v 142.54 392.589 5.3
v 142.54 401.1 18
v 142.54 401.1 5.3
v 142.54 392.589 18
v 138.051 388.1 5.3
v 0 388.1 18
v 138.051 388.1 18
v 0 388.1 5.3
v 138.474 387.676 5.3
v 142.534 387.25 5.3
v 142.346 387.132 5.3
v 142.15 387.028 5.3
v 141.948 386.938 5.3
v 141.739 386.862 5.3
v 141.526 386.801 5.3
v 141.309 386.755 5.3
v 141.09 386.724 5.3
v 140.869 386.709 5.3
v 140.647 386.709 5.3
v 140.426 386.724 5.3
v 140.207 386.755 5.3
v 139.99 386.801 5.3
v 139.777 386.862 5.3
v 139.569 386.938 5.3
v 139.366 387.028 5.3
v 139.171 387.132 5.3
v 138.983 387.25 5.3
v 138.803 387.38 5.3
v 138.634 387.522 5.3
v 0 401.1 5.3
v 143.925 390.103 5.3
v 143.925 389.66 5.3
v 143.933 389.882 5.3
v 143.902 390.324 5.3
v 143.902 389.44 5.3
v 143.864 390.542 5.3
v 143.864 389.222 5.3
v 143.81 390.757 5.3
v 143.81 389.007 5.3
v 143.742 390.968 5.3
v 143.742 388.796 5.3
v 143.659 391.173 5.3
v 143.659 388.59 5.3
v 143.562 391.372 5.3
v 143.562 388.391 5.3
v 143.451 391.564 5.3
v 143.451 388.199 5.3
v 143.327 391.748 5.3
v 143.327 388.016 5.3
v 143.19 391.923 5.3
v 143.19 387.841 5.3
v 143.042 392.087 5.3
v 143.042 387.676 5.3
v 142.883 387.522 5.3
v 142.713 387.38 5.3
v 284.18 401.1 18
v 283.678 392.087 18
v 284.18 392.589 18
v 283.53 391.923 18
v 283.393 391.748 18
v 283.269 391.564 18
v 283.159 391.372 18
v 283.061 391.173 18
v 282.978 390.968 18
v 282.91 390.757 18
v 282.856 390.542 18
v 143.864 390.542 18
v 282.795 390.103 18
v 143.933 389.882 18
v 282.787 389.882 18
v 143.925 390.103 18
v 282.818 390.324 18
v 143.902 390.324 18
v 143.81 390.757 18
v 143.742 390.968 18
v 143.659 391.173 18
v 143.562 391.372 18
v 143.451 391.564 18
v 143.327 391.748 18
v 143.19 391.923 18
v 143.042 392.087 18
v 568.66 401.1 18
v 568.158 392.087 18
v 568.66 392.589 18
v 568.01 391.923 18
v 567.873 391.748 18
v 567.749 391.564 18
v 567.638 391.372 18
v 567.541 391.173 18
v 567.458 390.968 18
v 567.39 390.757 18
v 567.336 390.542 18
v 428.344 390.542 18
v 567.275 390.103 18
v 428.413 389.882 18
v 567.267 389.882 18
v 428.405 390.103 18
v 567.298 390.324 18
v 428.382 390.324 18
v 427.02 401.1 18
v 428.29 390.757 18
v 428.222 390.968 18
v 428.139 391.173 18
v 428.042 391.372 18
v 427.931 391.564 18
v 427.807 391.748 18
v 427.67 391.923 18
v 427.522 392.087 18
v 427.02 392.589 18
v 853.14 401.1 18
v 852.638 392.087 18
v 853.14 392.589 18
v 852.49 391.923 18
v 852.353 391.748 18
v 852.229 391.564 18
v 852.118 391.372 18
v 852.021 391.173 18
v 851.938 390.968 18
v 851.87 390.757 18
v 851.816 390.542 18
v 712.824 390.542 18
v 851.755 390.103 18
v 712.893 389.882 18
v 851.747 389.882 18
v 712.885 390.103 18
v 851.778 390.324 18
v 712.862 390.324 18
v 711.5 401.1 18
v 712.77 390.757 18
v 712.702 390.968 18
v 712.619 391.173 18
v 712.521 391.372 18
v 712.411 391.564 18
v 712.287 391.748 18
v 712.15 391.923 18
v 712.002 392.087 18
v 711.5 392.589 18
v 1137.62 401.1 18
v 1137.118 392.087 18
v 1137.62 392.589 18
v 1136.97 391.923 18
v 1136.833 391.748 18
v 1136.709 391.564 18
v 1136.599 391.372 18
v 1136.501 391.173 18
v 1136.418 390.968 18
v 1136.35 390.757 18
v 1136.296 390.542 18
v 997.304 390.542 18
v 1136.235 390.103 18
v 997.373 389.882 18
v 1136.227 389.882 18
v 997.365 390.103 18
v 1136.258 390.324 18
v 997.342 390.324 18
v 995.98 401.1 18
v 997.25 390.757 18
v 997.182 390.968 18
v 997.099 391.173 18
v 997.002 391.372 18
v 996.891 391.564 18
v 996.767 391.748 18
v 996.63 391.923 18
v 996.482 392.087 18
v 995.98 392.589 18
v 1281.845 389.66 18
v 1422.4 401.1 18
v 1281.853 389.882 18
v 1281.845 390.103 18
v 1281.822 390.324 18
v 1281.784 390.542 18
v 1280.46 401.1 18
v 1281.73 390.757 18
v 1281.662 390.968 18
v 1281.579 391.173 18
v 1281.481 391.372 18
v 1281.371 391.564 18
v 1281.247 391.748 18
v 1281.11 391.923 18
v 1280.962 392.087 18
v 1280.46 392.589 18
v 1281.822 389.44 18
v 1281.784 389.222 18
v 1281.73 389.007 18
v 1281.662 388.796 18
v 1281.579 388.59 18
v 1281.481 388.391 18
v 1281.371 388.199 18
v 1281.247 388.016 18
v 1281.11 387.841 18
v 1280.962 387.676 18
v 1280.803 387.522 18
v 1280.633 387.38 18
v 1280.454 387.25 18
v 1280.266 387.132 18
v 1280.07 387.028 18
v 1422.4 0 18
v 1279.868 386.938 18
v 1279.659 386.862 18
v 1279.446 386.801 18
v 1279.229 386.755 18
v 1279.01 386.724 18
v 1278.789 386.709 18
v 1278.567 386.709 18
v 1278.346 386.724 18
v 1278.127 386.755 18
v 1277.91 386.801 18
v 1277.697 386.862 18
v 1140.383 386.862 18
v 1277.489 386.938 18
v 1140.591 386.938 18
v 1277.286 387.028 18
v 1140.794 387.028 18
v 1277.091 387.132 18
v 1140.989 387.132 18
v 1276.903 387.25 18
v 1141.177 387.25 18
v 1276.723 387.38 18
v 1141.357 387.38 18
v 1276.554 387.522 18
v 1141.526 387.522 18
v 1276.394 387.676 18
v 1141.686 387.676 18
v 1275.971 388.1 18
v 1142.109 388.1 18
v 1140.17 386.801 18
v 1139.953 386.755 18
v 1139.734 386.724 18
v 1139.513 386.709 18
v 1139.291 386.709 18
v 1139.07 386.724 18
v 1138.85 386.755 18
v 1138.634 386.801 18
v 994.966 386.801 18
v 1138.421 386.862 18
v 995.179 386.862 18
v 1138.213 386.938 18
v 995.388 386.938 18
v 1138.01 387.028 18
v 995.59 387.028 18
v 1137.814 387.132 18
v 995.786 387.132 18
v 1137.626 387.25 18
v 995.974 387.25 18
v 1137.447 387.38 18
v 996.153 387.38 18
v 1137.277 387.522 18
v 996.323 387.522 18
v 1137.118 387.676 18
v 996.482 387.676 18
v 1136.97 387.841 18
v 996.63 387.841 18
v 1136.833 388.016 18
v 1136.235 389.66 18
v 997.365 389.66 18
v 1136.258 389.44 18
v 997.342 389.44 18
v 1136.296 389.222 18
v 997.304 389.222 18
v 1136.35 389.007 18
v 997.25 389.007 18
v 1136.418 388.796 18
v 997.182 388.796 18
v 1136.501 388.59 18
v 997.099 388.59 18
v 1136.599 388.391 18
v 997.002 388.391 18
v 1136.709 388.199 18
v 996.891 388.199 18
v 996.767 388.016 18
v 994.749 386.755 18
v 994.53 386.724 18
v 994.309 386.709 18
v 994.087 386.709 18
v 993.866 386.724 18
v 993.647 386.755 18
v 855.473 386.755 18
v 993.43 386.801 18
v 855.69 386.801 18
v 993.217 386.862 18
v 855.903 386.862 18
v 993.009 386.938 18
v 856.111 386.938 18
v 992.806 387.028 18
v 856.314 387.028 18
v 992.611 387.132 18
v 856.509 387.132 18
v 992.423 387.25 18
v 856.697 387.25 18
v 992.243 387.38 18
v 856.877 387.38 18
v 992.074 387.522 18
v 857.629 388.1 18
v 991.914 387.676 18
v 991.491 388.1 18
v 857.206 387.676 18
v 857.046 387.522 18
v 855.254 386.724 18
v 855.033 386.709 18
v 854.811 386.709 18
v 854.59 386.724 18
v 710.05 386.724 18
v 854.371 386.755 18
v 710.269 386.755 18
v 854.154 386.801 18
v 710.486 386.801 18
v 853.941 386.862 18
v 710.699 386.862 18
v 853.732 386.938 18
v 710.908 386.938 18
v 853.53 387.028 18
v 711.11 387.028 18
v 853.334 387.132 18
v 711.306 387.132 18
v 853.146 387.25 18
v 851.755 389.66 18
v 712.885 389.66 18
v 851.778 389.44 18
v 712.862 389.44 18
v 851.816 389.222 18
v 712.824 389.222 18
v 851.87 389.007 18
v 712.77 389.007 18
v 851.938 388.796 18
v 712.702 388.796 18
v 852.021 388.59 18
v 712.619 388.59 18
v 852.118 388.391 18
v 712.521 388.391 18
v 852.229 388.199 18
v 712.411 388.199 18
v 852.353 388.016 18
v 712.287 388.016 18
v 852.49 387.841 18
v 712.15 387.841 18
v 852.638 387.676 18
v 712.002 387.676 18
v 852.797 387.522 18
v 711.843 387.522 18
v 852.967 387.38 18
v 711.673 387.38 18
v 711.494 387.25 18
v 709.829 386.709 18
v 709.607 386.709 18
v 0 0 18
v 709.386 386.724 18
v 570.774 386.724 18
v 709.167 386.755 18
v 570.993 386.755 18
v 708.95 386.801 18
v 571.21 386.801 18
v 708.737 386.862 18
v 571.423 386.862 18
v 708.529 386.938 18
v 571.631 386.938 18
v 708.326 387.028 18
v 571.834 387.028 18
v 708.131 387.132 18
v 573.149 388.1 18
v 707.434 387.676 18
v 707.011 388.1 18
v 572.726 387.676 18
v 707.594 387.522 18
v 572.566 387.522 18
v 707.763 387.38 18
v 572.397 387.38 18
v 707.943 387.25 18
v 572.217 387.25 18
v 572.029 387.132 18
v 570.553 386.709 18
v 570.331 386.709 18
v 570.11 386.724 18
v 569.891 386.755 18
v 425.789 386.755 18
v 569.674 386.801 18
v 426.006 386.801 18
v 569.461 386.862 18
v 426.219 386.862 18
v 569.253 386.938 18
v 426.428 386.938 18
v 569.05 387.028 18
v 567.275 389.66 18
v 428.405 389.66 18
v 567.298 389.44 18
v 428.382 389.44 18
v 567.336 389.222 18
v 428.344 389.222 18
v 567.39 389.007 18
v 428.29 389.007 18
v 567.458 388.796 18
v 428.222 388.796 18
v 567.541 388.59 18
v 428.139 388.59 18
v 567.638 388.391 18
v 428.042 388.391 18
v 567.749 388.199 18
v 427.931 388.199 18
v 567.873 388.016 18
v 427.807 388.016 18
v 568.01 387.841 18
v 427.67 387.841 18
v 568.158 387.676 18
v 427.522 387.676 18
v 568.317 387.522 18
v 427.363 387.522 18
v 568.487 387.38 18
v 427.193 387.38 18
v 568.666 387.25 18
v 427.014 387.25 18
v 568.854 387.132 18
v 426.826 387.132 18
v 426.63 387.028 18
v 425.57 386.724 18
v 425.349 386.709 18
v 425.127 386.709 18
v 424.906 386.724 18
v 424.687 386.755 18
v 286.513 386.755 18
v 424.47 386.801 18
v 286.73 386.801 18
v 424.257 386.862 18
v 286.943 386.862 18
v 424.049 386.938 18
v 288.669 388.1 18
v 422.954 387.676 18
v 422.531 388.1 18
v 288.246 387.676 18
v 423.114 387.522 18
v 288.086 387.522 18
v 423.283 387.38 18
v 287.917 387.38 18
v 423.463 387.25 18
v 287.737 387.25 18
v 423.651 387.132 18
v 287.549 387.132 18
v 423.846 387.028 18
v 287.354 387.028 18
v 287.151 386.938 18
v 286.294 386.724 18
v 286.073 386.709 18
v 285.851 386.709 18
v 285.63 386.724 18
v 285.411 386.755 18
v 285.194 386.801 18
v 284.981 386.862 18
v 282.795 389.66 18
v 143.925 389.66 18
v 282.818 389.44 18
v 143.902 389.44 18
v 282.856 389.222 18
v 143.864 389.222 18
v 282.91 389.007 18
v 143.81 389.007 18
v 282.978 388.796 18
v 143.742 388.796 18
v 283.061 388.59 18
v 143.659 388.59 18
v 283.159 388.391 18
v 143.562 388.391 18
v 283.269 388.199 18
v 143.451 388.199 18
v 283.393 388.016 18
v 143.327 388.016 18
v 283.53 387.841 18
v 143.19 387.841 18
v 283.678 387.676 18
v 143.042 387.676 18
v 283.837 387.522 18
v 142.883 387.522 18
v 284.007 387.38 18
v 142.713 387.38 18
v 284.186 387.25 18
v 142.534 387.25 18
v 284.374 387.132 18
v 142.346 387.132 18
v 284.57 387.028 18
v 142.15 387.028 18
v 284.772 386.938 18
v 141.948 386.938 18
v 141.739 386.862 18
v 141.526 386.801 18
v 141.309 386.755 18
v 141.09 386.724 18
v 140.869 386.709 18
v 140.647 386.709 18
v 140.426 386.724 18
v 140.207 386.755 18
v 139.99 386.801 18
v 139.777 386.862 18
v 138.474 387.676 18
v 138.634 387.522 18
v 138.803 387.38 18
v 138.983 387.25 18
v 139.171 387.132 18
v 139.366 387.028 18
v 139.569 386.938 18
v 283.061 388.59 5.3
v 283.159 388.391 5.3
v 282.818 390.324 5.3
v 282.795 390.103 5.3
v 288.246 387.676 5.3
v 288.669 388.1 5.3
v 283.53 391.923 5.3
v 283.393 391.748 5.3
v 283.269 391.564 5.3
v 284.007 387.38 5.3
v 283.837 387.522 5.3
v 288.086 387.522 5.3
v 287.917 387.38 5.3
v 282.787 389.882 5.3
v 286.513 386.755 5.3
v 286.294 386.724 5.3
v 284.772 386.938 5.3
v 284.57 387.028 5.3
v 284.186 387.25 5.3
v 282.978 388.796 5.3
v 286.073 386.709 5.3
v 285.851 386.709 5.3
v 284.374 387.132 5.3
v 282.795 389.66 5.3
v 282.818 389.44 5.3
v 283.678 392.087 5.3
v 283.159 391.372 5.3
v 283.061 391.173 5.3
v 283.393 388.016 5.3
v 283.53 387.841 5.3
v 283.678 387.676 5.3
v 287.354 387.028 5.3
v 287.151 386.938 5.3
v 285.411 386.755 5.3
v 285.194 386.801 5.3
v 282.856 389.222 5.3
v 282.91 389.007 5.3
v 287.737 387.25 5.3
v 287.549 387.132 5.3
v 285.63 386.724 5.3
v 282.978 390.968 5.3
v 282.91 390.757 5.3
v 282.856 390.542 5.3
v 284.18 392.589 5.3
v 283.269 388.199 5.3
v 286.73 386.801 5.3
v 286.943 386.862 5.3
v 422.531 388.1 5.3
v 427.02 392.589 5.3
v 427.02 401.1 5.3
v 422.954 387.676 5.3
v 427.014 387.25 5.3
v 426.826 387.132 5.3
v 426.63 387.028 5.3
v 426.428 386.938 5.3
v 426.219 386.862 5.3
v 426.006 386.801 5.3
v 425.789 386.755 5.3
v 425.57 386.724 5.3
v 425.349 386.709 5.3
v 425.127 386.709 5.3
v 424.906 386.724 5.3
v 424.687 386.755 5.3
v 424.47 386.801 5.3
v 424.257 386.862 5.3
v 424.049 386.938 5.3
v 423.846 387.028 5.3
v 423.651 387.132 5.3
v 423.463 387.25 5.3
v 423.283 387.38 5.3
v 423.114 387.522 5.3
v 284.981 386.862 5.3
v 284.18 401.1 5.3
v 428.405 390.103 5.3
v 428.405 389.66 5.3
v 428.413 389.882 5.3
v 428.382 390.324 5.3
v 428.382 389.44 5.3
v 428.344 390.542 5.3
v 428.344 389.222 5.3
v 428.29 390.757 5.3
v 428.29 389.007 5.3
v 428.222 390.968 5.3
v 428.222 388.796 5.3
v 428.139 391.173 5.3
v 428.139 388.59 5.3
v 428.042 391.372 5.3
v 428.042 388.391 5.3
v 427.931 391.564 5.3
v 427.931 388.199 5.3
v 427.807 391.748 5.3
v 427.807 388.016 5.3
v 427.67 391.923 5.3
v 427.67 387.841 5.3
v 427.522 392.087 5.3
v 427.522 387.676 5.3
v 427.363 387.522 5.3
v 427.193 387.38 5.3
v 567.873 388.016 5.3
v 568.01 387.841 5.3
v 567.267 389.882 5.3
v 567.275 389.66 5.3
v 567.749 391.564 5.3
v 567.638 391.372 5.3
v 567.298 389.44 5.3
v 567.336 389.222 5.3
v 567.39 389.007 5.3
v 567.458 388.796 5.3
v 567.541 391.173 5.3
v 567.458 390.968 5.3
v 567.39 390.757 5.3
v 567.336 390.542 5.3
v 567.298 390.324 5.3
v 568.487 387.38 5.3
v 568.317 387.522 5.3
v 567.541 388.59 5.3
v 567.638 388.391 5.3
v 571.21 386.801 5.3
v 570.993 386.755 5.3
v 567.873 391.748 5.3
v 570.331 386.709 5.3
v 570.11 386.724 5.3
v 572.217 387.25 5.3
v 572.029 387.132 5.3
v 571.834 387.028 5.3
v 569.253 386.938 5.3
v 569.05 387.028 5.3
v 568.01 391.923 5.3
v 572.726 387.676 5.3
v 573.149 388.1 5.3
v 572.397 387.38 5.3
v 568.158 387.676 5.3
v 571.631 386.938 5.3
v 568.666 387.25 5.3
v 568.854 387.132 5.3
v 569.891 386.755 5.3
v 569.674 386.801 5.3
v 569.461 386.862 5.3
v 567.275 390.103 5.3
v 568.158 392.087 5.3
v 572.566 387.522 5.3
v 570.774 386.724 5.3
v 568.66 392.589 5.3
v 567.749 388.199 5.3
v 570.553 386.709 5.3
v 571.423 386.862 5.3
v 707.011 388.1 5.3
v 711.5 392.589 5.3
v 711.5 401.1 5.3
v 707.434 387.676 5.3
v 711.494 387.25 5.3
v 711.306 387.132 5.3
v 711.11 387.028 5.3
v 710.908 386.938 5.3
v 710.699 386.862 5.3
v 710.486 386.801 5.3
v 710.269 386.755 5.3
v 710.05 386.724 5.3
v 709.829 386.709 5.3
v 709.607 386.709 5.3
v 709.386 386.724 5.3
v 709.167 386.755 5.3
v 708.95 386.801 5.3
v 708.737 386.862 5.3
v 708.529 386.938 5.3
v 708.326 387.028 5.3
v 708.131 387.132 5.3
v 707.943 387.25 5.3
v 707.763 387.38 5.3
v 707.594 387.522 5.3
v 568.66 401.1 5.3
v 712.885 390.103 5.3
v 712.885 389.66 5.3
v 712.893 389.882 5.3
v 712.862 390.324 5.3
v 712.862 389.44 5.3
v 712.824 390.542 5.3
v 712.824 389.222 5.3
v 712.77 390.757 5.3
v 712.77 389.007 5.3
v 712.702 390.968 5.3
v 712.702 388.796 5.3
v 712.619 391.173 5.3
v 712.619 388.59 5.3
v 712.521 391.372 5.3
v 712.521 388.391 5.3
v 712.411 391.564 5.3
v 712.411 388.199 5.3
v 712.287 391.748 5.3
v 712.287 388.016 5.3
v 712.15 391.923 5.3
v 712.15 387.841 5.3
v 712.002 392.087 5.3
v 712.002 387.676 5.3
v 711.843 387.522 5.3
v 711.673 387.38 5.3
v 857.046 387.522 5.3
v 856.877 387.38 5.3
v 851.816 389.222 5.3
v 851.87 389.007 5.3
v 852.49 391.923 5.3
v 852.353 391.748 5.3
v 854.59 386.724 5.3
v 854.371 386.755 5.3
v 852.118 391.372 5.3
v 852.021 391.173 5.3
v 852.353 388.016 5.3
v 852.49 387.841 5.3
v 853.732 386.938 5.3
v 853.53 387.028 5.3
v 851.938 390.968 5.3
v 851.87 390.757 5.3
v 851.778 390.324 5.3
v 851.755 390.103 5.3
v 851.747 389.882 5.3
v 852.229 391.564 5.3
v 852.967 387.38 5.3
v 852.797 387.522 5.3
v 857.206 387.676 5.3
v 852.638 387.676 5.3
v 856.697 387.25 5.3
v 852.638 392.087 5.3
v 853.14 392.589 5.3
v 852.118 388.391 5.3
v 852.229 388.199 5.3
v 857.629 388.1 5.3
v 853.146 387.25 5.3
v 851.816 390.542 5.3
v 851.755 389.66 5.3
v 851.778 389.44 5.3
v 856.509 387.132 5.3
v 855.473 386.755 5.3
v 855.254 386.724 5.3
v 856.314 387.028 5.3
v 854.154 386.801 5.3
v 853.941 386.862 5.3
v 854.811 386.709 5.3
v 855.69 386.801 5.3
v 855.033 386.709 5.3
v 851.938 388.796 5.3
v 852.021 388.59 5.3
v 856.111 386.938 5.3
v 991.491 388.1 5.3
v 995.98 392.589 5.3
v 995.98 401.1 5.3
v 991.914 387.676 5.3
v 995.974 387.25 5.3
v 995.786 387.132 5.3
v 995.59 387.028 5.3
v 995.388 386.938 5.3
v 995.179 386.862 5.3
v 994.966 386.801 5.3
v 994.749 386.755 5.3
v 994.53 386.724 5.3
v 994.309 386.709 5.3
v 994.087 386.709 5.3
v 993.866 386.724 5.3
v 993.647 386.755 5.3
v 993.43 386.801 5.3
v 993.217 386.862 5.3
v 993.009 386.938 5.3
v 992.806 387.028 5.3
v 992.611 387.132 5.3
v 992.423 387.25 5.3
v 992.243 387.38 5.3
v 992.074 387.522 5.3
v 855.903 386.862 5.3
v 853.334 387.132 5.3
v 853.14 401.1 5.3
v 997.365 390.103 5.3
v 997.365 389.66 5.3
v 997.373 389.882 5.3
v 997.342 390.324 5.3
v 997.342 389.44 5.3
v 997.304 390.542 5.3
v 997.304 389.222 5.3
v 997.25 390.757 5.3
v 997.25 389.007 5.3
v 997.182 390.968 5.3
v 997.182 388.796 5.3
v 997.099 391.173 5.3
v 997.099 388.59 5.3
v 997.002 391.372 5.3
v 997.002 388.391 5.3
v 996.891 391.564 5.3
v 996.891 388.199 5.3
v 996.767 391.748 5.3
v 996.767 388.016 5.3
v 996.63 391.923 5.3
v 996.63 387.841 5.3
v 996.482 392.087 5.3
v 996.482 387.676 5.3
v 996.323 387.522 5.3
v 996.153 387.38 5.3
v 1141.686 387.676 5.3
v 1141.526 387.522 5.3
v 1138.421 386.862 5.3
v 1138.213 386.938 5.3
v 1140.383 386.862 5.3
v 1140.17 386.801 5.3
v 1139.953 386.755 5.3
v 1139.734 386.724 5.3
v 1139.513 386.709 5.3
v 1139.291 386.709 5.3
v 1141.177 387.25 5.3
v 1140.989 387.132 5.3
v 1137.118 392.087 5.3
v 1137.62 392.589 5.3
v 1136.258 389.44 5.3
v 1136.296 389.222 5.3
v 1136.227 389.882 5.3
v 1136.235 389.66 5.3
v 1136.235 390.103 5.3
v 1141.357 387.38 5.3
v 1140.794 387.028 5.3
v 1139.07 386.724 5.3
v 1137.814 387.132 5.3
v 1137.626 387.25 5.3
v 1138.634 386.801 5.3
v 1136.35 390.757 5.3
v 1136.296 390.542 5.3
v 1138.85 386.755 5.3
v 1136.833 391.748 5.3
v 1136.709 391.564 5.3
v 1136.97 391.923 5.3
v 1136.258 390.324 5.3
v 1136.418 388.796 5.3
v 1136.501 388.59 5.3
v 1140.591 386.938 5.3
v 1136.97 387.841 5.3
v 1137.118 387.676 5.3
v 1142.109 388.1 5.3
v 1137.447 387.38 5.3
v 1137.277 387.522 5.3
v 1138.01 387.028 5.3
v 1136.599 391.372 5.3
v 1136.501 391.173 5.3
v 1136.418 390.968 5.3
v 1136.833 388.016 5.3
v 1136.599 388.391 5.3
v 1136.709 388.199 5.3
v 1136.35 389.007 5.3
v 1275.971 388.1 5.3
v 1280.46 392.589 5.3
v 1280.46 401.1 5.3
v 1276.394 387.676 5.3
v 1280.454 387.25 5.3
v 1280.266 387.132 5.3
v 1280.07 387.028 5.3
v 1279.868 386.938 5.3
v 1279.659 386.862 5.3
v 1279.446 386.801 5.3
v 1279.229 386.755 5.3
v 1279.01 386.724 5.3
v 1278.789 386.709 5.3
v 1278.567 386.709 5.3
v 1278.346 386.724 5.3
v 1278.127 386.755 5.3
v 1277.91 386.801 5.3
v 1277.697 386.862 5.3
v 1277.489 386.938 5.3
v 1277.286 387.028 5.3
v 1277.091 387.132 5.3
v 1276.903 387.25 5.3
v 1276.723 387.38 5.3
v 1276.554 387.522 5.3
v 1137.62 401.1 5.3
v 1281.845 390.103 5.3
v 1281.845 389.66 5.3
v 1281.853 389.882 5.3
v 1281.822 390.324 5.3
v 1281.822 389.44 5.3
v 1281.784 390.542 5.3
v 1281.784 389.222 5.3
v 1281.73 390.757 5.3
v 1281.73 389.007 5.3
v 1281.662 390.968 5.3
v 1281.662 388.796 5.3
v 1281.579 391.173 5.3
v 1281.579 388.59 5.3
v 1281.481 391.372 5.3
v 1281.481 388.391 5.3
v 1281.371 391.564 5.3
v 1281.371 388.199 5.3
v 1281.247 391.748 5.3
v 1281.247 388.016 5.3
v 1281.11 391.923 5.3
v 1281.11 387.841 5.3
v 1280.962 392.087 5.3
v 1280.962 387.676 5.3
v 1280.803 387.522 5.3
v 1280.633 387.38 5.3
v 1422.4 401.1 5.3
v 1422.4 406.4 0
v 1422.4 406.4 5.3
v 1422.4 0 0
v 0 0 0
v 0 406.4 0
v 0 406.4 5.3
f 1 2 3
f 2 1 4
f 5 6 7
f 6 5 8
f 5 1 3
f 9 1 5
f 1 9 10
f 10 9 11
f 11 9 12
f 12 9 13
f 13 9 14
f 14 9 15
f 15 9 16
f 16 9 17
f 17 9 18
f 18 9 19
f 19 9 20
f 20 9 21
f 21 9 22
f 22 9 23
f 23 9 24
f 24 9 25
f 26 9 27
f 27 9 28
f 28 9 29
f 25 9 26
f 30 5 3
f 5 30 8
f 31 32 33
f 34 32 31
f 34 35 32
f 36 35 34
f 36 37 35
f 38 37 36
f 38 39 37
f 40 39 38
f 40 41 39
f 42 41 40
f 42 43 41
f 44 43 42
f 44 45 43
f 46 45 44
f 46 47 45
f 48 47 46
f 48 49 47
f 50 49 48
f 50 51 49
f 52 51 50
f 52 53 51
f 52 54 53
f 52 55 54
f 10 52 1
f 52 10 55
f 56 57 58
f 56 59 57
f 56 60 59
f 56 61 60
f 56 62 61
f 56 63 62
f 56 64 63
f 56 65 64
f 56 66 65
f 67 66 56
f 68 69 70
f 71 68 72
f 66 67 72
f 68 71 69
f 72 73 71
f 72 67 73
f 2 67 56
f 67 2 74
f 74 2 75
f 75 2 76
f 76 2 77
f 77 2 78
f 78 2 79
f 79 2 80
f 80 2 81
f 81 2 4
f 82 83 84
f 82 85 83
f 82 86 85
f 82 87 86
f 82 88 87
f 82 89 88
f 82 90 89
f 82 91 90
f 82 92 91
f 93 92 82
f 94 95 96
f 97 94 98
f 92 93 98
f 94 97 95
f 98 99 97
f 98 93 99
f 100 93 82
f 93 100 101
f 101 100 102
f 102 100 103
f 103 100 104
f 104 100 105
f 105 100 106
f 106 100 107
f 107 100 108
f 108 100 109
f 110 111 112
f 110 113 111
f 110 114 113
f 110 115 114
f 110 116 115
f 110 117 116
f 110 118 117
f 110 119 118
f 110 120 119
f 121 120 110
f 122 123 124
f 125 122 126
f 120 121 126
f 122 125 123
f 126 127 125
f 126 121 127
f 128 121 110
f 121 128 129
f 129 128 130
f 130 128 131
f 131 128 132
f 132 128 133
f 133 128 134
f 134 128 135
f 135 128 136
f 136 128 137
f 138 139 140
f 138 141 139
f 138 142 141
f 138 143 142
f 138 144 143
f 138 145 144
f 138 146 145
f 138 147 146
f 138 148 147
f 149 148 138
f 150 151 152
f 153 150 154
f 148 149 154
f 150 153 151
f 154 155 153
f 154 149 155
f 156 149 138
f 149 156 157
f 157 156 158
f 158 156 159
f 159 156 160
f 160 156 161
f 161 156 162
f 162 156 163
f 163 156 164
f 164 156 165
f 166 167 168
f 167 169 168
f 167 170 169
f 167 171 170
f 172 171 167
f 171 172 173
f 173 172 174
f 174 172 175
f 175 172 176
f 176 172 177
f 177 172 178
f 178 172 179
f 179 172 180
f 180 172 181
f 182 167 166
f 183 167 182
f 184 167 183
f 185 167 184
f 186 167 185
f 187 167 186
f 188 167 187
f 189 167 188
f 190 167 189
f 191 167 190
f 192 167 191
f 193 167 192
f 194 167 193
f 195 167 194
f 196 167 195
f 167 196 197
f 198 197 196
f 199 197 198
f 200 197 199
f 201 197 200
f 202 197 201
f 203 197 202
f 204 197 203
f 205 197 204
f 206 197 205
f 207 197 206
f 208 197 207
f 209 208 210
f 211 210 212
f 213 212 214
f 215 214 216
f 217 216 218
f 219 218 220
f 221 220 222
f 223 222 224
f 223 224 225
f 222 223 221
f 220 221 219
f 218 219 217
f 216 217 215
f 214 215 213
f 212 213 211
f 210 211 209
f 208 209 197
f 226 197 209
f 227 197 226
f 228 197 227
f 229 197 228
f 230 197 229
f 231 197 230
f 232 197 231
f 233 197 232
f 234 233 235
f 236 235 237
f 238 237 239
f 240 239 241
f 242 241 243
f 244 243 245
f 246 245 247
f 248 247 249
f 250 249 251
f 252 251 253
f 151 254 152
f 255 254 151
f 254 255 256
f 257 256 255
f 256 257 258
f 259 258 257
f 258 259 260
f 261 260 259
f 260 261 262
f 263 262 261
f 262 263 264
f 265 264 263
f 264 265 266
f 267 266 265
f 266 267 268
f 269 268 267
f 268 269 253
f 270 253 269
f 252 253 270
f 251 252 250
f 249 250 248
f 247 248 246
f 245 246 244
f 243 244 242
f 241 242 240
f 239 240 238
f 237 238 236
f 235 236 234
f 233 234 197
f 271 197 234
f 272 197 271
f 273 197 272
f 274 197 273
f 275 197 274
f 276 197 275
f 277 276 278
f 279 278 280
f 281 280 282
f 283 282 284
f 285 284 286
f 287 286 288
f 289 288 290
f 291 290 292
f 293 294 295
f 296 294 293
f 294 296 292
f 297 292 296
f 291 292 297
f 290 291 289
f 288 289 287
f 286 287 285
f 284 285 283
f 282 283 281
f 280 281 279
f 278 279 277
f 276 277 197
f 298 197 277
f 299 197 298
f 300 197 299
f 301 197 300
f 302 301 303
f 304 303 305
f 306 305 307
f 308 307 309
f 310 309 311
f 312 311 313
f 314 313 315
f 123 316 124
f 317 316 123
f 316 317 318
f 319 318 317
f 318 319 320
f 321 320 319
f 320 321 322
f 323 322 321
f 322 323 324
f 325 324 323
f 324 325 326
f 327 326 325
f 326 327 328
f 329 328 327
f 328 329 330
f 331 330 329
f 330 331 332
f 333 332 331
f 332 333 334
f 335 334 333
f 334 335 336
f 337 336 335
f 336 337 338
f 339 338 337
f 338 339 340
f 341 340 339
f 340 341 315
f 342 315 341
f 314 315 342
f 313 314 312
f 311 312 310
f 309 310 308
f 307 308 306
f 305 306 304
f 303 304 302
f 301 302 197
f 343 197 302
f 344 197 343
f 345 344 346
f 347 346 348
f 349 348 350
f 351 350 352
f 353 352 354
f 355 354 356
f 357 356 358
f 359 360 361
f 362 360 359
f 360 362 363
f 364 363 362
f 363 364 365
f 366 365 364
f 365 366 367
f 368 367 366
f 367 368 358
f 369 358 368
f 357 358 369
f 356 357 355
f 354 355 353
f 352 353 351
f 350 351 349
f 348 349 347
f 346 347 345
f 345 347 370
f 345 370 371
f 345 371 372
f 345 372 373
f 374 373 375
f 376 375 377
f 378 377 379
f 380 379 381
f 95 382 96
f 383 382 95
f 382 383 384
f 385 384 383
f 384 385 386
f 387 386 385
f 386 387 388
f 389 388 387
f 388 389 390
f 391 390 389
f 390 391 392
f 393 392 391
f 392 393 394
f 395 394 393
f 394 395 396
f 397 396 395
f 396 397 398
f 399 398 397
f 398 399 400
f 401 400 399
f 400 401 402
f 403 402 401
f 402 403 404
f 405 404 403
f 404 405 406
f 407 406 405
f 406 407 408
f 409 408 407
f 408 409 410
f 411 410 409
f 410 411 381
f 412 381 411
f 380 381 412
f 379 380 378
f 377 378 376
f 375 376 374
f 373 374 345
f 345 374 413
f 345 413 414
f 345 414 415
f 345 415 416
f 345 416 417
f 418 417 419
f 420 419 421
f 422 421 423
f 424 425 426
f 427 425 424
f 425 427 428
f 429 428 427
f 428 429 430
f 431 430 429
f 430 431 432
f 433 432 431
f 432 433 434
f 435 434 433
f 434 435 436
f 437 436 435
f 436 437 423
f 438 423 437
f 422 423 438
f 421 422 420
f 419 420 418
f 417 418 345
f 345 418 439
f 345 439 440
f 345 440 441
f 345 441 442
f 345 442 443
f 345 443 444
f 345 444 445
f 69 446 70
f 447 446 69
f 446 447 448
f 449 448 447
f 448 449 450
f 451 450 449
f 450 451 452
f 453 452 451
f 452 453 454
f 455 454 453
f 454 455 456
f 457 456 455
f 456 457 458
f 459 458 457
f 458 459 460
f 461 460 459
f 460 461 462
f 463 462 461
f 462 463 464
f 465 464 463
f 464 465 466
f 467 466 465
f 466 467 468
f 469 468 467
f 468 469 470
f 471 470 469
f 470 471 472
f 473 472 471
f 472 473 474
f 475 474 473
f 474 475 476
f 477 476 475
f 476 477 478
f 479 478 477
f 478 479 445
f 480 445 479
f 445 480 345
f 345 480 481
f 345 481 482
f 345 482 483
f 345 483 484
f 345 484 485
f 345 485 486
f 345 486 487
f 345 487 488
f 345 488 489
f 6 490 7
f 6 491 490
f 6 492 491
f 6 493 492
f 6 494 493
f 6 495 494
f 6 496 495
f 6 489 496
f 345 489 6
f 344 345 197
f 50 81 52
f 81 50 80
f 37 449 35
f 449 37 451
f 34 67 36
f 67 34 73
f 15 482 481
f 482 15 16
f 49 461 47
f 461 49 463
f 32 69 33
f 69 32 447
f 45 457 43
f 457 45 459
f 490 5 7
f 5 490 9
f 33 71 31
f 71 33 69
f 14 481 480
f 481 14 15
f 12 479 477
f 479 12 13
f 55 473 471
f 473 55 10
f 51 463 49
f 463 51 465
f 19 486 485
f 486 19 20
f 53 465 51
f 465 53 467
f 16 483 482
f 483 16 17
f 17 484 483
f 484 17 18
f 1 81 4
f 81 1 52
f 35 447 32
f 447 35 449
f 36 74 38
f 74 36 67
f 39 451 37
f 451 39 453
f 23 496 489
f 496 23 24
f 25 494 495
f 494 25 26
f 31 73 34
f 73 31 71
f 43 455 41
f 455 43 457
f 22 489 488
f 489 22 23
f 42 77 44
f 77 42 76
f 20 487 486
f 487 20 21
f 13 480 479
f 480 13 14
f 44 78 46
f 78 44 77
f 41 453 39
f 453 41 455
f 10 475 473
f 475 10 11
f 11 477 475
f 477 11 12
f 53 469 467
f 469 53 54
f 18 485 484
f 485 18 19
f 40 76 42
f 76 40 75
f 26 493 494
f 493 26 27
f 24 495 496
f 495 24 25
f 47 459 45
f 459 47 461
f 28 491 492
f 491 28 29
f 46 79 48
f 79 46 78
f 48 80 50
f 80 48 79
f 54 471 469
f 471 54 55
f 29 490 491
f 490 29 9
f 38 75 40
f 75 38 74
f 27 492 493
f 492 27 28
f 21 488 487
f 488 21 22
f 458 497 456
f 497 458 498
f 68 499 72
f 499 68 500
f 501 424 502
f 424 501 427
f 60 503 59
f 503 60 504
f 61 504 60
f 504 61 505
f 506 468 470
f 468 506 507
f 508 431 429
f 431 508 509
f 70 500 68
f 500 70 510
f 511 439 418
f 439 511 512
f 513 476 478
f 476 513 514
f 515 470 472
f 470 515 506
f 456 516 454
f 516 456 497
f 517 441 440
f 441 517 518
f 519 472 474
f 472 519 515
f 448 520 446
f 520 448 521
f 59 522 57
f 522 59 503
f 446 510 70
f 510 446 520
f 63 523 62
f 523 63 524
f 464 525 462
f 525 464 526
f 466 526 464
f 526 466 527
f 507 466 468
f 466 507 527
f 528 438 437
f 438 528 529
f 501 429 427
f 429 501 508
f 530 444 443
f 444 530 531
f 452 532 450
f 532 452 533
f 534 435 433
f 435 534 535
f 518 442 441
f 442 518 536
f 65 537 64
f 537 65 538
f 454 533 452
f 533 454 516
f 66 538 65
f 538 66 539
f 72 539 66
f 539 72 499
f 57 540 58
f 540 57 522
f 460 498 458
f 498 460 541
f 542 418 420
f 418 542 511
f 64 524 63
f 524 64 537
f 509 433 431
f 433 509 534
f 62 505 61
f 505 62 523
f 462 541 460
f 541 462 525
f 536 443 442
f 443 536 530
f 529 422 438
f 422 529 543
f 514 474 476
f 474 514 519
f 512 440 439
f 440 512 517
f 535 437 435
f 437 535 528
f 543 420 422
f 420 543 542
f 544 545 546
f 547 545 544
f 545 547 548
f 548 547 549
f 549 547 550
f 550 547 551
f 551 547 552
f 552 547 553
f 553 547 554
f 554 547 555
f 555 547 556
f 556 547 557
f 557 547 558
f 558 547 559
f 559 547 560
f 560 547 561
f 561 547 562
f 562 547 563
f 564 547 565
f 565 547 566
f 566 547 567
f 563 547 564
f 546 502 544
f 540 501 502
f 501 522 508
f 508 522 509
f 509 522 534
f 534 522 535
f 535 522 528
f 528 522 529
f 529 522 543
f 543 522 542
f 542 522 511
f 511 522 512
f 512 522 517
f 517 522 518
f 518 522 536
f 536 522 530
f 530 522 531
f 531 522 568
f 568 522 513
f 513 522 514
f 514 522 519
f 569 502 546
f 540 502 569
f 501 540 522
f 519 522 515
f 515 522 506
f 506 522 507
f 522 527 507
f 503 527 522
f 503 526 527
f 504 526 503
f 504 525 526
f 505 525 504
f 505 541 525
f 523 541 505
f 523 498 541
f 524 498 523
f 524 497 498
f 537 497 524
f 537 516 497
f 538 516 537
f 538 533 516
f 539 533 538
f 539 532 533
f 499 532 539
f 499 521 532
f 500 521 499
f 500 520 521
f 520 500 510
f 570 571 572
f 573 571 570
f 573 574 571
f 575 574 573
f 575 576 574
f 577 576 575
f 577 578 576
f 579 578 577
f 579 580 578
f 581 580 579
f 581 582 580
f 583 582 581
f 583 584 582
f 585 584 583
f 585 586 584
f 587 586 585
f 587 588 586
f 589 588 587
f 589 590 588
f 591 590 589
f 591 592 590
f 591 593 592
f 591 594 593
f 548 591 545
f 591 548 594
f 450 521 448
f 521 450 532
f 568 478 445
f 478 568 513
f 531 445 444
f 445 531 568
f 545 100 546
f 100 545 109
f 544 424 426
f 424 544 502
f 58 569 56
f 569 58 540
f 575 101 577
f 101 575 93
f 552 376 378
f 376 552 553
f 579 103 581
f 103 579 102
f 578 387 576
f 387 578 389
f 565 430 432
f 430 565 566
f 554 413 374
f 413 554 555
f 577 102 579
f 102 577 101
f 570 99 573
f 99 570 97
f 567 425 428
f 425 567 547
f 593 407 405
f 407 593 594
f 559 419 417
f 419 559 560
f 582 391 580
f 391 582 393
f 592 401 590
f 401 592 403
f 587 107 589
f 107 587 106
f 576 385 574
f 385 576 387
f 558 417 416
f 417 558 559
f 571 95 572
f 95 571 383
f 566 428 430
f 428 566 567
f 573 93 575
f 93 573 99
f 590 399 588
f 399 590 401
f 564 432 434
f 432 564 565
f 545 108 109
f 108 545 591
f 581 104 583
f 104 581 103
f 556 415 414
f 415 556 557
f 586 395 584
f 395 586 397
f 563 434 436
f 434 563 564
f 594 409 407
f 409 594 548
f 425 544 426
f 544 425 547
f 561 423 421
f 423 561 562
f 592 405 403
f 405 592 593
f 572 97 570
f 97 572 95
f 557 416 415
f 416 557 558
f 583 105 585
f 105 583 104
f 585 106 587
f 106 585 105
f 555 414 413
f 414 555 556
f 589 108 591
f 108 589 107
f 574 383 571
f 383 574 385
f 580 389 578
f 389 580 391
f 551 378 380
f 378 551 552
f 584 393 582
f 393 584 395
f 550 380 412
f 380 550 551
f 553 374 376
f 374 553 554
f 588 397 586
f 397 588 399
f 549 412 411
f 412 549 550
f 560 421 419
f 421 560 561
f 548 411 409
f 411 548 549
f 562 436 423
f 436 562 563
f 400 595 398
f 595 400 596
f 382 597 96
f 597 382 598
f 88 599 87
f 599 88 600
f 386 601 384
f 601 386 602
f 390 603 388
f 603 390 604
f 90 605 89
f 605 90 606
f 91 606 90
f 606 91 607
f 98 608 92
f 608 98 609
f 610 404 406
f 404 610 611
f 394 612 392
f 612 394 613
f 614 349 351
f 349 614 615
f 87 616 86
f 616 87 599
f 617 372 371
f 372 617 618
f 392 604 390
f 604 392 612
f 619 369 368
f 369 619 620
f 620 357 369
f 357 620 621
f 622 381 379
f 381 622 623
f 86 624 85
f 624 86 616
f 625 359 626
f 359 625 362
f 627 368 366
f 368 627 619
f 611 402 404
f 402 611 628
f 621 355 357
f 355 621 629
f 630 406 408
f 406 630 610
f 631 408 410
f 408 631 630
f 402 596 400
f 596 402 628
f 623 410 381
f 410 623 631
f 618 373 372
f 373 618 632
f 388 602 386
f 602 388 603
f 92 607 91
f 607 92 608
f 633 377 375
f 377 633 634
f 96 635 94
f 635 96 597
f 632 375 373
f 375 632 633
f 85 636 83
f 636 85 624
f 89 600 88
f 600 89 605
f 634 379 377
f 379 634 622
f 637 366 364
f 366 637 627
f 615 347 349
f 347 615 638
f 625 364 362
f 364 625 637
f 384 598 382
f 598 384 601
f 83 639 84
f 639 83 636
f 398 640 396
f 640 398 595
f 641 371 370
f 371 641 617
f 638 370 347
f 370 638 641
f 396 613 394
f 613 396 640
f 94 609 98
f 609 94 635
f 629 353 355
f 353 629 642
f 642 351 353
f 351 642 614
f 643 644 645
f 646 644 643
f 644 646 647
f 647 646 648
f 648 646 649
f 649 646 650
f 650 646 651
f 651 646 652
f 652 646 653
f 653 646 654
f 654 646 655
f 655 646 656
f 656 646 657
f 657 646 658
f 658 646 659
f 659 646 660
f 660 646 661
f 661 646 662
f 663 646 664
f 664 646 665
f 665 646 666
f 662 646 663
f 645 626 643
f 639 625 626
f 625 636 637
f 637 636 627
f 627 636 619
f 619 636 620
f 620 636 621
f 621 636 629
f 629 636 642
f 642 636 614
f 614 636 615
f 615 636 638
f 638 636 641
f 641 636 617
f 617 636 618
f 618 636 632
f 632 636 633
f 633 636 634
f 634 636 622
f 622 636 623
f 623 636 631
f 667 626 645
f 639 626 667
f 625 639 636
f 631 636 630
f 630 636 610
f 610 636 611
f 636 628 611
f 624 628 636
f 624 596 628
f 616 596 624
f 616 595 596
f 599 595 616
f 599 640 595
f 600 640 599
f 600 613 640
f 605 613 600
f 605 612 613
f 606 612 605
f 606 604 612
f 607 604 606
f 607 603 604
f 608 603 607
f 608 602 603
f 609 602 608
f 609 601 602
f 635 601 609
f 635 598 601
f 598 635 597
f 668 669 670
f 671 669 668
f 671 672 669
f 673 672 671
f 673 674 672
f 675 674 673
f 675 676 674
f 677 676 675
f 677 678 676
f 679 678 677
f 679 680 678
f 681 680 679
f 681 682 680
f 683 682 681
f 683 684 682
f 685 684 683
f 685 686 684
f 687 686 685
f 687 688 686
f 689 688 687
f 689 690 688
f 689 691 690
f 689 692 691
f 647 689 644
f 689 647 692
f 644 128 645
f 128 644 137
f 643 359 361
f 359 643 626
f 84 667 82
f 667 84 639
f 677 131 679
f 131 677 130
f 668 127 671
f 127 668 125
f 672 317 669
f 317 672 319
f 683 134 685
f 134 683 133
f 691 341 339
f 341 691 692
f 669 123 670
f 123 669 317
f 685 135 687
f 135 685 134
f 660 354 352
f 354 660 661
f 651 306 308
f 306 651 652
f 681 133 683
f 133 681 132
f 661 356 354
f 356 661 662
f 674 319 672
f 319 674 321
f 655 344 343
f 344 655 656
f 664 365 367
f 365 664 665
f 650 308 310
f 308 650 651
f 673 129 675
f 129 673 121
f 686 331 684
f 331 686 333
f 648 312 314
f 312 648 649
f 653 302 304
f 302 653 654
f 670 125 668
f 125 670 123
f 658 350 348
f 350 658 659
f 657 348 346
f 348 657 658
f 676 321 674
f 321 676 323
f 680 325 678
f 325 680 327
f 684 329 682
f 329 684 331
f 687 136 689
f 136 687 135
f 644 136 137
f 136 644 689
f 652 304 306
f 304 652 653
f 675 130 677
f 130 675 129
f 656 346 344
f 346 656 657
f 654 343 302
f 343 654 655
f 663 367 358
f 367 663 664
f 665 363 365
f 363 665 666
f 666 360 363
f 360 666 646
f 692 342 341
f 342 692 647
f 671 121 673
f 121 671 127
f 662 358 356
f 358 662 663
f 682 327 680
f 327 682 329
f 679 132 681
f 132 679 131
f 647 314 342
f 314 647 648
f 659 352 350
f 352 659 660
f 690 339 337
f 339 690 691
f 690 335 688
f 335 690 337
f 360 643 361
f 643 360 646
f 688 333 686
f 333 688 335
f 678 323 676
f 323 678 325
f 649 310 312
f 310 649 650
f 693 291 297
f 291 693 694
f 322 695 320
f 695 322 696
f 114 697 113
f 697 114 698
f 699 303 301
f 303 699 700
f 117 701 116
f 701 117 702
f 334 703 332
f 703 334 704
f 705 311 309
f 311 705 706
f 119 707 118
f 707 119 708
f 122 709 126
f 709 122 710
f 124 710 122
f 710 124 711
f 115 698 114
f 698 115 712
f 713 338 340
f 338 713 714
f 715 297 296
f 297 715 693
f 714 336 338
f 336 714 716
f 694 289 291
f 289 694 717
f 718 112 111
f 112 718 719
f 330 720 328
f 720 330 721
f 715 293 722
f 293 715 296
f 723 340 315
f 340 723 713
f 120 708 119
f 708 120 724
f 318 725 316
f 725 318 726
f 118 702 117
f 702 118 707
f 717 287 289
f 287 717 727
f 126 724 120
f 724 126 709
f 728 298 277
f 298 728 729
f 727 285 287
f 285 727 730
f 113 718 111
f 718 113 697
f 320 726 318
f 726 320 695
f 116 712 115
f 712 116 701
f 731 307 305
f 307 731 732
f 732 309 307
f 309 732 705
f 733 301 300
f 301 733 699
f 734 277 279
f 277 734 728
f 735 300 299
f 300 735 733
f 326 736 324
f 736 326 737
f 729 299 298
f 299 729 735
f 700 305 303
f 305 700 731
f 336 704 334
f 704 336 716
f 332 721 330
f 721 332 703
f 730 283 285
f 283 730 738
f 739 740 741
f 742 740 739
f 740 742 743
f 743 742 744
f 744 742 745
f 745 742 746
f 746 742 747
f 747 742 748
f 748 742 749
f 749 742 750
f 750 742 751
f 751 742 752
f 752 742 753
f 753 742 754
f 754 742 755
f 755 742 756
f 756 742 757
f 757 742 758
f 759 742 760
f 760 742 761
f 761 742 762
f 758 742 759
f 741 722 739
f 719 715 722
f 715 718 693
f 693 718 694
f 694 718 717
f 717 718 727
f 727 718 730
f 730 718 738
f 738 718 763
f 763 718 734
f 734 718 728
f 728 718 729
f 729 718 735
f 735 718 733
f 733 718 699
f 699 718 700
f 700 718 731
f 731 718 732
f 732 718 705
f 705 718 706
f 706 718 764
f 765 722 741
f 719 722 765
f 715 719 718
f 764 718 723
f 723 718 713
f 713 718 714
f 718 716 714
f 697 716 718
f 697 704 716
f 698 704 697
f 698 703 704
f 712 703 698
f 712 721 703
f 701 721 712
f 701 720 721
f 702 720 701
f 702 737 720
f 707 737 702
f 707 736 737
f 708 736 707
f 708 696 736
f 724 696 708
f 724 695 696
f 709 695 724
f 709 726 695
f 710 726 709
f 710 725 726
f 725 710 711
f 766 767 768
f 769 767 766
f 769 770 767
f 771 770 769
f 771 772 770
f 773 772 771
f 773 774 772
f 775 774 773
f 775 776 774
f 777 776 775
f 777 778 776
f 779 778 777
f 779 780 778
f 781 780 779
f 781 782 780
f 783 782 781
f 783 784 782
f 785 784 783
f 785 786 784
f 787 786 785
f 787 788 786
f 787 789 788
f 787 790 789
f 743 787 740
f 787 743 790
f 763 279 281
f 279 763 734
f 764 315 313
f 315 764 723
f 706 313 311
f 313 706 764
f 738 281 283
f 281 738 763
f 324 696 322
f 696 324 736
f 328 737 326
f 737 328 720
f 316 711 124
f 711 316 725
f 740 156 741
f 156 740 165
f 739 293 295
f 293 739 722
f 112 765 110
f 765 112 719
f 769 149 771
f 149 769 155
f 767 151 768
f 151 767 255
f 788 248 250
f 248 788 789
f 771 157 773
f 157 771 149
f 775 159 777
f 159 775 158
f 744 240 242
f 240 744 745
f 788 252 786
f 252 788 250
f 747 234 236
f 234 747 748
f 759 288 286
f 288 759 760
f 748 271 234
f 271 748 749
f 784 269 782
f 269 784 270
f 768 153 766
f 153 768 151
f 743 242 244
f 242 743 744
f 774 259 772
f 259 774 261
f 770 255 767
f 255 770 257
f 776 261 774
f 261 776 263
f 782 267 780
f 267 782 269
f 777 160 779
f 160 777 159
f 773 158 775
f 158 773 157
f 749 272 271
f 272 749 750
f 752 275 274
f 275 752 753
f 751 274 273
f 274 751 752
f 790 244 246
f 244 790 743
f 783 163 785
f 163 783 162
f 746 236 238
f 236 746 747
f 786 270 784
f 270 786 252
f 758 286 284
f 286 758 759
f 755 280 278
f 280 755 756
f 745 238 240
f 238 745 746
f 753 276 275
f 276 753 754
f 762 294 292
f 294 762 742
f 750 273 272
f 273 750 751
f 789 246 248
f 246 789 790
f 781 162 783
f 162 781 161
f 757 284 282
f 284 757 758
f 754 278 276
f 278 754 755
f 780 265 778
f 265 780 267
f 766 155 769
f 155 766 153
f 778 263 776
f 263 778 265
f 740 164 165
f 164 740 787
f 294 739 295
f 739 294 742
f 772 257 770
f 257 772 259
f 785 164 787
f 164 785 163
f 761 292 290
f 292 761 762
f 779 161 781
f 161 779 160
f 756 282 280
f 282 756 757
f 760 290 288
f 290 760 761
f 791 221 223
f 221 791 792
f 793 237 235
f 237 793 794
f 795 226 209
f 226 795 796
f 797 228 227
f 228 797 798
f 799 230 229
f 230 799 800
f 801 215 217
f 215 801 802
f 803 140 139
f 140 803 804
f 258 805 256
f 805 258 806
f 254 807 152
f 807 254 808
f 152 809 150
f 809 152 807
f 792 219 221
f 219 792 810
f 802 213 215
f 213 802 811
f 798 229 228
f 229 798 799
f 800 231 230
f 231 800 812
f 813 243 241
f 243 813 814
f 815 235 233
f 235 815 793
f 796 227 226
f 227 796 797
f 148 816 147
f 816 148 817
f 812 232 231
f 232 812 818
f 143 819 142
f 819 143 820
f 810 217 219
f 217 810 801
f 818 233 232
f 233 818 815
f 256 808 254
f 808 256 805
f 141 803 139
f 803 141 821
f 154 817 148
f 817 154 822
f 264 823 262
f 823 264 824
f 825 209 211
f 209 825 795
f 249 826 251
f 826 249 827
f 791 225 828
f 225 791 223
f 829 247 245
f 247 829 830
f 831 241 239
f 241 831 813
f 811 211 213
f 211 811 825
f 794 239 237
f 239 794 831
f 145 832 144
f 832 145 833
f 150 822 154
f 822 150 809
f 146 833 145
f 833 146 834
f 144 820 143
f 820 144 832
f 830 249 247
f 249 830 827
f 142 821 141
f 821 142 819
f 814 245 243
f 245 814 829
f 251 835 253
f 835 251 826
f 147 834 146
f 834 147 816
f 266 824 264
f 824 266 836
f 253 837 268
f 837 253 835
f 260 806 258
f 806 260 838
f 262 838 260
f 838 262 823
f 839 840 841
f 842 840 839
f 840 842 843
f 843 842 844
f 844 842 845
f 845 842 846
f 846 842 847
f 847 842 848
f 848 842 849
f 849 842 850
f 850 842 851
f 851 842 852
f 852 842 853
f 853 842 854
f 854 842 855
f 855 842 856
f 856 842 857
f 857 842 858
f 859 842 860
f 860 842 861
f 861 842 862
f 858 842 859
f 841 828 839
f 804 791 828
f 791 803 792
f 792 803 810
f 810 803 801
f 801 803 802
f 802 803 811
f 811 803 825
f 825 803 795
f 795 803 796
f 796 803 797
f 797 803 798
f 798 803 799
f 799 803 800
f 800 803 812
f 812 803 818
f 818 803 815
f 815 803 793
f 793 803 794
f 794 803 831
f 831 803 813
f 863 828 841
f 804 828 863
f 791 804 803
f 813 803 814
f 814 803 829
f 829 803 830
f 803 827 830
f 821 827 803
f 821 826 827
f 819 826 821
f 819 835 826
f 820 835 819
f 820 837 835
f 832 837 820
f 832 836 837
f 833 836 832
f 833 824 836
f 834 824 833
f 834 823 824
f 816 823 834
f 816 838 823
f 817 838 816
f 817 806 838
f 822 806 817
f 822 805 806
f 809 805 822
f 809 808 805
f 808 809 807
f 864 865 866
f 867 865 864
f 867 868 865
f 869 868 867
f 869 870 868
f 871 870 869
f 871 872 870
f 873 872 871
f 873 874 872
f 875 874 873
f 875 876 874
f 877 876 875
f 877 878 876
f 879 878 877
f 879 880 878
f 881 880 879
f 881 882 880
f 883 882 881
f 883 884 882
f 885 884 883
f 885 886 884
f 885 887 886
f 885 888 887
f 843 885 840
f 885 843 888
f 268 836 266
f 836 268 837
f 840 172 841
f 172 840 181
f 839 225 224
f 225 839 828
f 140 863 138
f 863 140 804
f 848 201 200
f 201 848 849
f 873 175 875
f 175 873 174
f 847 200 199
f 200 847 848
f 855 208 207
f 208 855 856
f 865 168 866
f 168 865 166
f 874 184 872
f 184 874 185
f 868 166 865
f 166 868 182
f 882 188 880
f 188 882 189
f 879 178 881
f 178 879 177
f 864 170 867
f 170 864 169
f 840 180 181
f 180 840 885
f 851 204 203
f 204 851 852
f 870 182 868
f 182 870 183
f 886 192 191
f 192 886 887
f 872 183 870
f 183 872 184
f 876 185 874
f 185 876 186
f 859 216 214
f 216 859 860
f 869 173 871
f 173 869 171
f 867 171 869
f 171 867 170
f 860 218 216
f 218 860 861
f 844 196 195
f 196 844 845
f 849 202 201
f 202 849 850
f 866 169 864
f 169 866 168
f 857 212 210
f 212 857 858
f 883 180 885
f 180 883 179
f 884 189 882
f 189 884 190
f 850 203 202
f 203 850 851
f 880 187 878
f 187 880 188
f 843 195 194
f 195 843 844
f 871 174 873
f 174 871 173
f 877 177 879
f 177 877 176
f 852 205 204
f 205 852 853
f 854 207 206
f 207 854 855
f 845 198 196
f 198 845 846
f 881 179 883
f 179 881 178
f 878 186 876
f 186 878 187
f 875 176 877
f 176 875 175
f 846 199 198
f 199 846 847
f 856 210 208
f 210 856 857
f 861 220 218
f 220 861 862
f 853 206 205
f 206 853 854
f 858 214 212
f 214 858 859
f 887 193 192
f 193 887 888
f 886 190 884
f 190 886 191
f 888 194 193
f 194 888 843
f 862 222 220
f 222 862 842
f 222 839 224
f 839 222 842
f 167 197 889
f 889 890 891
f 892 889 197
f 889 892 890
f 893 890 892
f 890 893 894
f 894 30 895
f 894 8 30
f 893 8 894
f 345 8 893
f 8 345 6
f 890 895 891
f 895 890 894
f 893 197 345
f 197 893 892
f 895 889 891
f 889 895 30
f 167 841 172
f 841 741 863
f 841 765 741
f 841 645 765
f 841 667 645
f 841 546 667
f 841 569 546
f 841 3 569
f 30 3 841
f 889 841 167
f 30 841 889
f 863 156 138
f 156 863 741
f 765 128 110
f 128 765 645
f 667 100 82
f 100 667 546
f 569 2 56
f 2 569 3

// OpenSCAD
$fn = 90;

difference() {
	cube(size = [1422.4000000000, 406.4000000000, 18]);
	translate(v = [0, 388.4000000000, 18]) {
		rotate(a = [-90, 0, 0]) {
			union() {
				translate(v = [-0.3000000000, 0, -0.3000000000]) {
					cube(center = false, size = [142.8400000000, 12.7000000000, 13.0000000000]);
				}
				hull() {
					translate(v = [139.3650000000, 0, 2.8750000000]) {
						rotate(a = [-90, 0, 0]) {
							cylinder(center = false, h = 12.7000000000, r = 3.1750000000);
						}
					}
					translate(v = [140.7581470319, 0, 1.4818529681]) {
						rotate(a = [-90, 0, 0]) {
							cylinder(center = false, h = 12.7000000000, r = 3.1750000000);
						}
					}
				}
				hull() {
					translate(v = [287.3550000000, 0, 2.8750000000]) {
						rotate(a = [-90, 0, 0]) {
							cylinder(center = false, h = 12.7000000000, r = 3.1750000000);
						}
					}
					translate(v = [285.9618529681, 0, 1.4818529681]) {
						rotate(a = [-90, 0, 0]) {
							cylinder(center = false, h = 12.7000000000, r = 3.1750000000);
						}
					}
				}
				translate(v = [284.1800000000, 0, -0.3000000000]) {
					cube(center = false, size = [142.8400000000, 12.7000000000, 13.0000000000]);
				}
				hull() {
					translate(v = [423.8450000000, 0, 2.8750000000]) {
						rotate(a = [-90, 0, 0]) {
							cylinder(center = false, h = 12.7000000000, r = 3.1750000000);
						}
					}
					translate(v = [425.2381470319, 0, 1.4818529681]) {
						rotate(a = [-90, 0, 0]) {
							cylinder(center = false, h = 12.7000000000, r = 3.1750000000);
						}
					}
				}
				hull() {
					translate(v = [571.8350000000, 0, 2.8750000000]) {
						rotate(a = [-90, 0, 0]) {
							cylinder(center = false, h = 12.7000000000, r = 3.1750000000);
						}
					}
					translate(v = [570.4418529681, 0, 1.4818529681]) {
						rotate(a = [-90, 0, 0]) {
							cylinder(center = false, h = 12.7000000000, r = 3.1750000000);
						}
					}
				}
				translate(v = [568.6600000000, 0, -0.3000000000]) {
					cube(center = false, size = [142.8400000000, 12.7000000000, 13.0000000000]);
				}
				hull() {
					translate(v = [708.3250000000, 0, 2.8750000000]) {
						rotate(a = [-90, 0, 0]) {
							cylinder(center = false, h = 12.7000000000, r = 3.1750000000);
						}
					}
					translate(v = [709.7181470319, 0, 1.4818529681]) {
						rotate(a = [-90, 0, 0]) {
							cylinder(center = false, h = 12.7000000000, r = 3.1750000000);
						}
					}
				}
				hull() {
					translate(v = [856.3150000000, 0, 2.8750000000]) {
						rotate(a = [-90, 0, 0]) {
							cylinder(center = false, h = 12.7000000000, r = 3.1750000000);
						}
					}
					translate(v = [854.9218529681, 0, 1.4818529681]) {
						rotate(a = [-90, 0, 0]) {
							cylinder(center = false, h = 12.7000000000, r = 3.1750000000);
						}
					}
				}
				translate(v = [853.1400000000, 0, -0.3000000000]) {
					cube(center = false, size = [142.8400000000, 12.7000000000, 13.0000000000]);
				}
				hull() {
					translate(v = [992.8050000000, 0, 2.8750000000]) {
						rotate(a = [-90, 0, 0]) {
							cylinder(center = false, h = 12.7000000000, r = 3.1750000000);
						}
					}
					translate(v = [994.1981470319, 0, 1.4818529681]) {
						rotate(a = [-90, 0, 0]) {
							cylinder(center = false, h = 12.7000000000, r = 3.1750000000);
						}
					}
				}
				hull() {
					translate(v = [1140.7950000000, 0, 2.8750000000]) {
						rotate(a = [-90, 0, 0]) {
							cylinder(center = false, h = 12.7000000000, r = 3.1750000000);
						}
					}
					translate(v = [1139.4018529681, 0, 1.4818529681]) {
						rotate(a = [-90, 0, 0]) {
							cylinder(center = false, h = 12.7000000000, r = 3.1750000000);
						}
					}
				}
				translate(v = [1137.6200000000, 0, -0.3000000000]) {
					cube(center = false, size = [142.8400000000, 12.7000000000, 13.0000000000]);
				}
				hull() {
					translate(v = [1277.2850000000, 0, 2.8750000000]) {
						rotate(a = [-90, 0, 0]) {
							cylinder(center = false, h = 12.7000000000, r = 3.1750000000);
						}
					}
					translate(v = [1278.6781470319, 0, 1.4818529681]) {
						rotate(a = [-90, 0, 0]) {
							cylinder(center = false, h = 12.7000000000, r = 3.1750000000);
						}
					}
				}
			}
		}
	}
	translate(v = [0, 401.1000000000, 5.3000000000]) {
		cube(size = [1422.4000000000, 5.3000000000, 12.7000000000]);
	}
}
/***********************************************
*********      SolidPython code:      **********
************************************************
 
#! /usr/bin/env python
# -*- coding: UTF-8 -*-
from __future__ import division
import os
import sys
import re

# Assumes SolidPython is in site-packages or elsewhwere in sys.path
from solid import *
from solid.utils import *
from tabs import *
from CutPiece import *

SEGMENTS = 90




def assembly(totalLength, sectionLength, cabinetHeight, cabinetWidth, legBoxHeight, legHeight, legAngle, ply, lTabCount, wTabCount, cutterDiameter, tabDepth, explode):
	top = CutPiece(
		translation = [0,0,cabinetHeight-ply],
		rotation = [0,0,0],
		geo = difference()(
			cube([totalLength, cabinetWidth, ply]),
			
			#back panel tabs
			translate([0,cabinetWidth-ply, ply])(
				rotate([-90,0,0])(squareTabCut(tabDepth, totalLength, tabDepth, cutterDiameter, lTabCount,alternate=False,allAround=False,hideHoles=False))
			),
			translate([0,cabinetWidth-ply+tabDepth, ply-tabDepth])(
				cube([totalLength, ply-tabDepth, tabDepth])
			)
		)
	)
	bottom = CutPiece(
		translation = [0,0,0],
		rotation = [0,0,0],
		geo = cube([totalLength, cabinetWidth, ply])
	)
	
	lSideOuter = CutPiece(
		translation = [0,0,ply],
		rotation = [0,0,0],
		geo = cube([ply, cabinetWidth, cabinetHeight-2*ply])
	)
	
	rSideOuter = CutPiece(
		translation = [totalLength-ply,0,ply],
		rotation = [0,0,0],
		geo = cube([ply, cabinetWidth, cabinetHeight-2*ply])
	)
	scad_render_to_file(top.geo, "sideboard\\top.scad", file_header='$fn = %s;' % SEGMENTS, include_orig_code=True)

	#scad_render_to_file(combined, "bench\\combined.scad", file_header='$fn = %s;' % SEGMENTS, include_orig_code=True)

if __name__ == '__main__':
	uom = 25.4
	ply = 18
	assembly(
		totalLength = 56 * uom,
		sectionLength = 20 * uom,
		cabinetHeight = 12 * uom,
		cabinetWidth = 16 * uom,
		legBoxHeight=2 * uom,
		legHeight = 6 * uom,
		legAngle = 30,
		ply = ply,
		lTabCount = 10,
		wTabCount = 5,
		cutterDiameter = 1/4*uom,
		tabDepth = 0.5 * uom,
		explode = 50
	)
 
 
************************************************/
